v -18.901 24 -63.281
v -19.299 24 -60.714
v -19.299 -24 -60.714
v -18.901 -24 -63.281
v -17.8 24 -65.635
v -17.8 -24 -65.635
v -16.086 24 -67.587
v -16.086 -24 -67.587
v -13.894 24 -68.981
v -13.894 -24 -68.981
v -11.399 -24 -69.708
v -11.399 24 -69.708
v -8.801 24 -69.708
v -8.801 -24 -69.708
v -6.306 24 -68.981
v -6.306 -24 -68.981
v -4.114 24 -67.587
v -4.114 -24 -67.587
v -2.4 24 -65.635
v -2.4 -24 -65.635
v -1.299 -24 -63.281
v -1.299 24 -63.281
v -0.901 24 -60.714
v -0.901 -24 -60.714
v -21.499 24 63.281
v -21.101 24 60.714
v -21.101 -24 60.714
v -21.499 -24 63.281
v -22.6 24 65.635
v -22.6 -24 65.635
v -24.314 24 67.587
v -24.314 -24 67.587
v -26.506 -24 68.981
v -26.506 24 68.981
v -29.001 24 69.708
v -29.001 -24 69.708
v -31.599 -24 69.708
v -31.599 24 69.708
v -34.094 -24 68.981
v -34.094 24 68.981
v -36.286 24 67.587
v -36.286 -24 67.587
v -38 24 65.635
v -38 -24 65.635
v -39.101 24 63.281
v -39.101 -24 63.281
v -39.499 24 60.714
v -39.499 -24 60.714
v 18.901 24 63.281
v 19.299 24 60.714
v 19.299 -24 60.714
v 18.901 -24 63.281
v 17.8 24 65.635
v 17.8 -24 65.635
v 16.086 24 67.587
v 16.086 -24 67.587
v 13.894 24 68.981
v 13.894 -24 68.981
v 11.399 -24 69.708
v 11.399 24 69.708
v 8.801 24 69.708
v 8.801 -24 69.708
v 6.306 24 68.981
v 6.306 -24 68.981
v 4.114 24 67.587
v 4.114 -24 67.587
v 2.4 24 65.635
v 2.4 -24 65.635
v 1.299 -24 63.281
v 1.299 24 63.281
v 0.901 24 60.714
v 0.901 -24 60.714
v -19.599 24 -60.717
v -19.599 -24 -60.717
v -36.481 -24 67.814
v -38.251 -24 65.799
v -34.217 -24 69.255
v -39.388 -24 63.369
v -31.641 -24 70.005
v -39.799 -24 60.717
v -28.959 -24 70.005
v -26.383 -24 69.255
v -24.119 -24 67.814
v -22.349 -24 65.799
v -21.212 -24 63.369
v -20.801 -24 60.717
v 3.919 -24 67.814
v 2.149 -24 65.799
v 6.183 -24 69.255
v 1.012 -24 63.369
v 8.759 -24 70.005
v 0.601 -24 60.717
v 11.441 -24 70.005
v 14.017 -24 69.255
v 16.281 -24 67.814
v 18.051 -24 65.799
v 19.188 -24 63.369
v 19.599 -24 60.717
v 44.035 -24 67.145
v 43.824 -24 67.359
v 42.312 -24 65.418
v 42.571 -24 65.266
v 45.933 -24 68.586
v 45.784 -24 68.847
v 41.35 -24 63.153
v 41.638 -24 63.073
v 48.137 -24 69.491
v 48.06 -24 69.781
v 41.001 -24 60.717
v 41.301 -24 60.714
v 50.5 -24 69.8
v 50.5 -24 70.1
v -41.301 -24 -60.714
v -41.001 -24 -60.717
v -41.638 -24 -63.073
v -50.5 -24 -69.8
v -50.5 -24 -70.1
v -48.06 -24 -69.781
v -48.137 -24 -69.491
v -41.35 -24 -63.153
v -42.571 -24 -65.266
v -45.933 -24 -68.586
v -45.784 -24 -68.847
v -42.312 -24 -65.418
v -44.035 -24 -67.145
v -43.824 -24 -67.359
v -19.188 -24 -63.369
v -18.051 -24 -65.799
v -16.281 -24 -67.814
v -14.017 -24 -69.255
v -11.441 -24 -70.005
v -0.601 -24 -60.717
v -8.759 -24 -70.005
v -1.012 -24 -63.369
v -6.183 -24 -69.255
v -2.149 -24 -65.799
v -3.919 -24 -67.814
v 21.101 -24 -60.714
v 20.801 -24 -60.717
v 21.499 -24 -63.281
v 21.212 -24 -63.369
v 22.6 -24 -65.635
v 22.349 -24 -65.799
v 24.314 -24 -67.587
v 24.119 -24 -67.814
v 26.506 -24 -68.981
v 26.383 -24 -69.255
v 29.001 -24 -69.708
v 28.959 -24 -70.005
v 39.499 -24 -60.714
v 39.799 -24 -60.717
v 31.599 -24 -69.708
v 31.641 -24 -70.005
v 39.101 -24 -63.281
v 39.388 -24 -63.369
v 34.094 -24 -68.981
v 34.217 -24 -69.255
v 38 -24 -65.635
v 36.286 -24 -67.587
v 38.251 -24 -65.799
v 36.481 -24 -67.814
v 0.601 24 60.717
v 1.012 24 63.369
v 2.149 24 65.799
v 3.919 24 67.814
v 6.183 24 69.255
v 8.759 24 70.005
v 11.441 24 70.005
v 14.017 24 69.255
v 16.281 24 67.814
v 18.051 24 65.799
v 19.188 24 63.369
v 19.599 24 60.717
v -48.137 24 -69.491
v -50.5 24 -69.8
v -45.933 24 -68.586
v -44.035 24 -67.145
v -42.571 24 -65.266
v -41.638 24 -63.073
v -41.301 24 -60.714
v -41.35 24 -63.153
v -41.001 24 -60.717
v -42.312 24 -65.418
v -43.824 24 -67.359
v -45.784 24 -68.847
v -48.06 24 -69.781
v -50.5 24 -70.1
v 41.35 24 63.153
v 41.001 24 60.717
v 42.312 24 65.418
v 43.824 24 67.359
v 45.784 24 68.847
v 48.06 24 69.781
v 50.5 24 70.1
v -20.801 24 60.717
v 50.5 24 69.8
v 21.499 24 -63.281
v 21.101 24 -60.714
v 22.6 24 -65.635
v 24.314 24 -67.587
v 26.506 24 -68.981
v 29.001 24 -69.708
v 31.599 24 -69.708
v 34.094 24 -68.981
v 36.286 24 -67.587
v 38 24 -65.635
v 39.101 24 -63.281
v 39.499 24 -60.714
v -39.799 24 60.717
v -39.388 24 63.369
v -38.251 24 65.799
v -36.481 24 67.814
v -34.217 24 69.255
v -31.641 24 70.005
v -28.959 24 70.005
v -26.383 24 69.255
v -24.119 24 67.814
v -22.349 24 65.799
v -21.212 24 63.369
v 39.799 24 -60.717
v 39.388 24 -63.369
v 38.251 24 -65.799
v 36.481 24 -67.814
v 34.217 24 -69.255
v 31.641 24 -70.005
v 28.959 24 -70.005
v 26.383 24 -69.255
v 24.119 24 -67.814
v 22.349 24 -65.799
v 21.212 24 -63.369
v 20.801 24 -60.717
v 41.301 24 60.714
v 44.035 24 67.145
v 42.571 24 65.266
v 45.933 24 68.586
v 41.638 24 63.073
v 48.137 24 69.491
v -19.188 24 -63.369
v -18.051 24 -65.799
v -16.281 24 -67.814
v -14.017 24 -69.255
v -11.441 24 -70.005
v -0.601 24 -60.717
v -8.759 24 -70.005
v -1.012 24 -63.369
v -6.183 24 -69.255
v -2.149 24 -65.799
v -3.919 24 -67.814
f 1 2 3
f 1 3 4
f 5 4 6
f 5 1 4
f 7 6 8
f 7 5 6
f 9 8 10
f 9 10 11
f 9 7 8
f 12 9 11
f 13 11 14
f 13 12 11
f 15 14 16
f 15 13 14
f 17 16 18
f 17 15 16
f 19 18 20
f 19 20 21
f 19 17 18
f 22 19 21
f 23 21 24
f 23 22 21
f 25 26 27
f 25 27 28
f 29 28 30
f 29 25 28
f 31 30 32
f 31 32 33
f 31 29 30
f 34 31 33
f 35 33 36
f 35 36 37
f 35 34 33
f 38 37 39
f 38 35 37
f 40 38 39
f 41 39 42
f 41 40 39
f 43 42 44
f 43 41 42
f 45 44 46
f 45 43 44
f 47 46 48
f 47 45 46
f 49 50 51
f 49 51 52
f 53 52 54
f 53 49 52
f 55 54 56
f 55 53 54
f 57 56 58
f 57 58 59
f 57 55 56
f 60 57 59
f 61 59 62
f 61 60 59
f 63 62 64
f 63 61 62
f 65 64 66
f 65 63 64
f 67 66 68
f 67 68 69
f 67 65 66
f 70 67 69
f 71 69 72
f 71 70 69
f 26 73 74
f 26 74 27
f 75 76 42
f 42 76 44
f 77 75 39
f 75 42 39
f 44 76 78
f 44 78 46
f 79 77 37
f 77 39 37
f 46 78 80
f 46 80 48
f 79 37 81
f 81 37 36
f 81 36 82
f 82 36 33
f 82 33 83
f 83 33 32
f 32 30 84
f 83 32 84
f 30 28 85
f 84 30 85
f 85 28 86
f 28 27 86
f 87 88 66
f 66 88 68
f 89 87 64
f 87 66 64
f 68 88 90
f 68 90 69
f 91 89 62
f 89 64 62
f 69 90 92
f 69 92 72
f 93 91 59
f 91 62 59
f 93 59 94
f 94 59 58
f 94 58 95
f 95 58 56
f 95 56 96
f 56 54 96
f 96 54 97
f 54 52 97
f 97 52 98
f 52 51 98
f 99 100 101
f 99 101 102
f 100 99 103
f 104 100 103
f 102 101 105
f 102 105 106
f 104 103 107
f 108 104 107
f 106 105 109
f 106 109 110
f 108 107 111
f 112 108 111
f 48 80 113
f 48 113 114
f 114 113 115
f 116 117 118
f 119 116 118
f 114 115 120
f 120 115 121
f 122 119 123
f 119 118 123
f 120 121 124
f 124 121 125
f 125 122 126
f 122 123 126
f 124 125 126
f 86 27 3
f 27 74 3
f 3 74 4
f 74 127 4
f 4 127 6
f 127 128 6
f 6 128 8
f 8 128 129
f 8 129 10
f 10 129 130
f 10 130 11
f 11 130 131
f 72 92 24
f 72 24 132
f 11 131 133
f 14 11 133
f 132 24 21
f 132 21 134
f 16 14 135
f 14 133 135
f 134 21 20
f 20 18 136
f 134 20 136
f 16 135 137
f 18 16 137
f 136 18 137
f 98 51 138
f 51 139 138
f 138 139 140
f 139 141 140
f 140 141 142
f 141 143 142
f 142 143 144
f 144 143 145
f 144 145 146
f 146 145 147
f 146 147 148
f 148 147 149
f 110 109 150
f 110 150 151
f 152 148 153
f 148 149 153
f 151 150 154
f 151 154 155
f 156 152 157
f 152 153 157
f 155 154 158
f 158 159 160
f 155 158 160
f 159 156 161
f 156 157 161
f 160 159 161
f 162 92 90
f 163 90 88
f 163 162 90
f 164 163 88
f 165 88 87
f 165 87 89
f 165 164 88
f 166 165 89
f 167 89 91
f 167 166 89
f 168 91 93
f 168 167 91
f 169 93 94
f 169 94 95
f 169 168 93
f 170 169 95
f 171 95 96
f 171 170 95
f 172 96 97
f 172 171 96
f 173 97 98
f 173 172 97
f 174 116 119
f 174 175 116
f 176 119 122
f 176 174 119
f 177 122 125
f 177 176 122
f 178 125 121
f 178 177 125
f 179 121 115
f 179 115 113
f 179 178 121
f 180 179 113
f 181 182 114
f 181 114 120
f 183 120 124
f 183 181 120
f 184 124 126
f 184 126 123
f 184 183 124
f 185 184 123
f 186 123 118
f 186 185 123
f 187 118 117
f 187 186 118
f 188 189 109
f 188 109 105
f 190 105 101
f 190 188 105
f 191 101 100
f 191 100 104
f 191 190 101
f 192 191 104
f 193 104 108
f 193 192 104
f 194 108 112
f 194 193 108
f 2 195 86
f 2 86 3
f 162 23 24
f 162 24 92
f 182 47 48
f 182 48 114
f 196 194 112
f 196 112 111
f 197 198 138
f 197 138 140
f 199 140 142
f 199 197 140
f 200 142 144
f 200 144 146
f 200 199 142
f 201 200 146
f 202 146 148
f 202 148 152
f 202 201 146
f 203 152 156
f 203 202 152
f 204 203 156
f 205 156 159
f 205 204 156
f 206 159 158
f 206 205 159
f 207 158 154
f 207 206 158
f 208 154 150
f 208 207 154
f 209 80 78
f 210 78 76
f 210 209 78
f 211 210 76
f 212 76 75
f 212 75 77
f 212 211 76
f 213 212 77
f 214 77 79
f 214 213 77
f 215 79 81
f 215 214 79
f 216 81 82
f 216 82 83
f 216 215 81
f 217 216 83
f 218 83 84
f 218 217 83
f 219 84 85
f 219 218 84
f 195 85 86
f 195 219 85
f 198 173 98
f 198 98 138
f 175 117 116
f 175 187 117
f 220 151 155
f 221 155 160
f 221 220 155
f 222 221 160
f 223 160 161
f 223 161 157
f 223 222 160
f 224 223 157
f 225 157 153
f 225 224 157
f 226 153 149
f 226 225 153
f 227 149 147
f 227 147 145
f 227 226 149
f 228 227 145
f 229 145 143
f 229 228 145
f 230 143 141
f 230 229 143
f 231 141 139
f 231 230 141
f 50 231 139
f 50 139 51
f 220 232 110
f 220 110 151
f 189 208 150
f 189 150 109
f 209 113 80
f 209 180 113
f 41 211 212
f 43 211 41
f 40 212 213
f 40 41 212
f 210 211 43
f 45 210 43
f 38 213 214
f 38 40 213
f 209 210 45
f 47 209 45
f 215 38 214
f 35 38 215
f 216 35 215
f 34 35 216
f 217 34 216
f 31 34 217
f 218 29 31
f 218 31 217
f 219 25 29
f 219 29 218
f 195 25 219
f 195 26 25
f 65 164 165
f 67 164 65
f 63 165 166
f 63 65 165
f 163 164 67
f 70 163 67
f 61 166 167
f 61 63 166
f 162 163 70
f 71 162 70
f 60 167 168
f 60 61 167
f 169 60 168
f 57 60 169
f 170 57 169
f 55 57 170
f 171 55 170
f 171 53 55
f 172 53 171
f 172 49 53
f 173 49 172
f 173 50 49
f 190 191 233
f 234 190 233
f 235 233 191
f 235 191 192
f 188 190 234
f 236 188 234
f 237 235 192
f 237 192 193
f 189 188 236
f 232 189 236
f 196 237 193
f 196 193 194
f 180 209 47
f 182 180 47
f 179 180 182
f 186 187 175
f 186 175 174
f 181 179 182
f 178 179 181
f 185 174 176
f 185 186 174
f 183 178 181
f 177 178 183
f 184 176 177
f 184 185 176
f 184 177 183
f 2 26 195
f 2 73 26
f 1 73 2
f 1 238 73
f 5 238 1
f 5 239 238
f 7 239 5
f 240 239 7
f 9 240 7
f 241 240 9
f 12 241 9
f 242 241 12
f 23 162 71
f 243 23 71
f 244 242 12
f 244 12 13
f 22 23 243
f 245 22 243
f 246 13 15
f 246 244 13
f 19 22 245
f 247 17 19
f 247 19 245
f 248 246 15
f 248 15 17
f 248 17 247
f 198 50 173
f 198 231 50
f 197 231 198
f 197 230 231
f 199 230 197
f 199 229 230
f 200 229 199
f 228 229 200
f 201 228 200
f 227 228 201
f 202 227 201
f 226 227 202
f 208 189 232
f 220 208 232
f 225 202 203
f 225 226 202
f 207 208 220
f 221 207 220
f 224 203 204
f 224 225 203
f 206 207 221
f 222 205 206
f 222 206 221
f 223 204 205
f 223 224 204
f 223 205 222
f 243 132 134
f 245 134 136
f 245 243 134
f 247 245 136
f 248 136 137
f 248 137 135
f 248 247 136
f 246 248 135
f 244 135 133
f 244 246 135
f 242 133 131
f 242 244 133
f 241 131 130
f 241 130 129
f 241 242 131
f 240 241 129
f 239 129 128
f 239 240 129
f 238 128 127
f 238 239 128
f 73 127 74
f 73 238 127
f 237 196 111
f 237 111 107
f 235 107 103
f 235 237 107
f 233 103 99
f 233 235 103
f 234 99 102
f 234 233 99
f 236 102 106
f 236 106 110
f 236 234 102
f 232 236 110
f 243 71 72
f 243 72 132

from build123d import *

# Parameters (mm, degrees)
BOSS_EXTRUDE1_DEPTH = 24


with BuildPart() as part:
    # Sketch1 → Boss-Extrude1 (new, symmetric)
    with BuildSketch(Plane(origin=(0, 0, 0), x_dir=(1, 0, 0), z_dir=(0, 1, 0))):
        with BuildLine():
            Line((-41.300703165, 60.713744192), (-39.799273906, -60.717453242))
            ThreePointArc((-39.799273906, -60.717453242), (-30.3, -70.1), (-20.800726094, -60.717453242))
            Line((-20.800726094, -60.717453242), (-19.299296835, 60.713744192))
            ThreePointArc((-19.299296835, 60.713744192), (-10.1, 69.8), (-0.900703165, 60.713744192))
            Line((-0.900703165, 60.713744192), (0.600726094, -60.717453242))
            ThreePointArc((0.600726094, -60.717453242), (10.1, -70.1), (19.599273906, -60.717453242))
            Line((19.599273906, -60.717453242), (21.100703165, 60.713744192))
            ThreePointArc((21.100703165, 60.713744192), (30.3, 69.8), (39.499296835, 60.713744192))
            Line((39.499296835, 60.713744192), (41.000726094, -60.717453242))
            ThreePointArc((41.000726094, -60.717453242), (43.824140722, -67.358912849), (50.5, -70.1))
            Line((50.5, -70.1), (50.5, -69.8))
            ThreePointArc((50.5, -69.8), (44.034957331, -67.145473496), (41.300703165, -60.713744192))
            Line((41.300703165, -60.713744192), (39.799273906, 60.717453242))
            ThreePointArc((39.799273906, 60.717453242), (30.3, 70.1), (20.800726094, 60.717453242))
            Line((20.800726094, 60.717453242), (19.299296835, -60.713744192))
            ThreePointArc((19.299296835, -60.713744192), (10.1, -69.8), (0.900703165, -60.713744192))
            Line((0.900703165, -60.713744192), (-0.600726094, 60.717453242))
            ThreePointArc((-0.600726094, 60.717453242), (-10.1, 70.1), (-19.599273906, 60.717453242))
            Line((-19.599273906, 60.717453242), (-21.100703165, -60.713744192))
            ThreePointArc((-21.100703165, -60.713744192), (-30.3, -69.8), (-39.499296835, -60.713744192))
            Line((-39.499296835, -60.713744192), (-41.000726094, 60.717453242))
            ThreePointArc((-41.000726094, 60.717453242), (-43.824140722, 67.358912849), (-50.5, 70.1))
            Line((-50.5, 70.1), (-50.5, 69.8))
            ThreePointArc((-50.5, 69.8), (-44.034957331, 67.145473496), (-41.300703165, 60.713744192))
        make_face()
    extrude(amount=BOSS_EXTRUDE1_DEPTH, both=True)


solid = part.part
